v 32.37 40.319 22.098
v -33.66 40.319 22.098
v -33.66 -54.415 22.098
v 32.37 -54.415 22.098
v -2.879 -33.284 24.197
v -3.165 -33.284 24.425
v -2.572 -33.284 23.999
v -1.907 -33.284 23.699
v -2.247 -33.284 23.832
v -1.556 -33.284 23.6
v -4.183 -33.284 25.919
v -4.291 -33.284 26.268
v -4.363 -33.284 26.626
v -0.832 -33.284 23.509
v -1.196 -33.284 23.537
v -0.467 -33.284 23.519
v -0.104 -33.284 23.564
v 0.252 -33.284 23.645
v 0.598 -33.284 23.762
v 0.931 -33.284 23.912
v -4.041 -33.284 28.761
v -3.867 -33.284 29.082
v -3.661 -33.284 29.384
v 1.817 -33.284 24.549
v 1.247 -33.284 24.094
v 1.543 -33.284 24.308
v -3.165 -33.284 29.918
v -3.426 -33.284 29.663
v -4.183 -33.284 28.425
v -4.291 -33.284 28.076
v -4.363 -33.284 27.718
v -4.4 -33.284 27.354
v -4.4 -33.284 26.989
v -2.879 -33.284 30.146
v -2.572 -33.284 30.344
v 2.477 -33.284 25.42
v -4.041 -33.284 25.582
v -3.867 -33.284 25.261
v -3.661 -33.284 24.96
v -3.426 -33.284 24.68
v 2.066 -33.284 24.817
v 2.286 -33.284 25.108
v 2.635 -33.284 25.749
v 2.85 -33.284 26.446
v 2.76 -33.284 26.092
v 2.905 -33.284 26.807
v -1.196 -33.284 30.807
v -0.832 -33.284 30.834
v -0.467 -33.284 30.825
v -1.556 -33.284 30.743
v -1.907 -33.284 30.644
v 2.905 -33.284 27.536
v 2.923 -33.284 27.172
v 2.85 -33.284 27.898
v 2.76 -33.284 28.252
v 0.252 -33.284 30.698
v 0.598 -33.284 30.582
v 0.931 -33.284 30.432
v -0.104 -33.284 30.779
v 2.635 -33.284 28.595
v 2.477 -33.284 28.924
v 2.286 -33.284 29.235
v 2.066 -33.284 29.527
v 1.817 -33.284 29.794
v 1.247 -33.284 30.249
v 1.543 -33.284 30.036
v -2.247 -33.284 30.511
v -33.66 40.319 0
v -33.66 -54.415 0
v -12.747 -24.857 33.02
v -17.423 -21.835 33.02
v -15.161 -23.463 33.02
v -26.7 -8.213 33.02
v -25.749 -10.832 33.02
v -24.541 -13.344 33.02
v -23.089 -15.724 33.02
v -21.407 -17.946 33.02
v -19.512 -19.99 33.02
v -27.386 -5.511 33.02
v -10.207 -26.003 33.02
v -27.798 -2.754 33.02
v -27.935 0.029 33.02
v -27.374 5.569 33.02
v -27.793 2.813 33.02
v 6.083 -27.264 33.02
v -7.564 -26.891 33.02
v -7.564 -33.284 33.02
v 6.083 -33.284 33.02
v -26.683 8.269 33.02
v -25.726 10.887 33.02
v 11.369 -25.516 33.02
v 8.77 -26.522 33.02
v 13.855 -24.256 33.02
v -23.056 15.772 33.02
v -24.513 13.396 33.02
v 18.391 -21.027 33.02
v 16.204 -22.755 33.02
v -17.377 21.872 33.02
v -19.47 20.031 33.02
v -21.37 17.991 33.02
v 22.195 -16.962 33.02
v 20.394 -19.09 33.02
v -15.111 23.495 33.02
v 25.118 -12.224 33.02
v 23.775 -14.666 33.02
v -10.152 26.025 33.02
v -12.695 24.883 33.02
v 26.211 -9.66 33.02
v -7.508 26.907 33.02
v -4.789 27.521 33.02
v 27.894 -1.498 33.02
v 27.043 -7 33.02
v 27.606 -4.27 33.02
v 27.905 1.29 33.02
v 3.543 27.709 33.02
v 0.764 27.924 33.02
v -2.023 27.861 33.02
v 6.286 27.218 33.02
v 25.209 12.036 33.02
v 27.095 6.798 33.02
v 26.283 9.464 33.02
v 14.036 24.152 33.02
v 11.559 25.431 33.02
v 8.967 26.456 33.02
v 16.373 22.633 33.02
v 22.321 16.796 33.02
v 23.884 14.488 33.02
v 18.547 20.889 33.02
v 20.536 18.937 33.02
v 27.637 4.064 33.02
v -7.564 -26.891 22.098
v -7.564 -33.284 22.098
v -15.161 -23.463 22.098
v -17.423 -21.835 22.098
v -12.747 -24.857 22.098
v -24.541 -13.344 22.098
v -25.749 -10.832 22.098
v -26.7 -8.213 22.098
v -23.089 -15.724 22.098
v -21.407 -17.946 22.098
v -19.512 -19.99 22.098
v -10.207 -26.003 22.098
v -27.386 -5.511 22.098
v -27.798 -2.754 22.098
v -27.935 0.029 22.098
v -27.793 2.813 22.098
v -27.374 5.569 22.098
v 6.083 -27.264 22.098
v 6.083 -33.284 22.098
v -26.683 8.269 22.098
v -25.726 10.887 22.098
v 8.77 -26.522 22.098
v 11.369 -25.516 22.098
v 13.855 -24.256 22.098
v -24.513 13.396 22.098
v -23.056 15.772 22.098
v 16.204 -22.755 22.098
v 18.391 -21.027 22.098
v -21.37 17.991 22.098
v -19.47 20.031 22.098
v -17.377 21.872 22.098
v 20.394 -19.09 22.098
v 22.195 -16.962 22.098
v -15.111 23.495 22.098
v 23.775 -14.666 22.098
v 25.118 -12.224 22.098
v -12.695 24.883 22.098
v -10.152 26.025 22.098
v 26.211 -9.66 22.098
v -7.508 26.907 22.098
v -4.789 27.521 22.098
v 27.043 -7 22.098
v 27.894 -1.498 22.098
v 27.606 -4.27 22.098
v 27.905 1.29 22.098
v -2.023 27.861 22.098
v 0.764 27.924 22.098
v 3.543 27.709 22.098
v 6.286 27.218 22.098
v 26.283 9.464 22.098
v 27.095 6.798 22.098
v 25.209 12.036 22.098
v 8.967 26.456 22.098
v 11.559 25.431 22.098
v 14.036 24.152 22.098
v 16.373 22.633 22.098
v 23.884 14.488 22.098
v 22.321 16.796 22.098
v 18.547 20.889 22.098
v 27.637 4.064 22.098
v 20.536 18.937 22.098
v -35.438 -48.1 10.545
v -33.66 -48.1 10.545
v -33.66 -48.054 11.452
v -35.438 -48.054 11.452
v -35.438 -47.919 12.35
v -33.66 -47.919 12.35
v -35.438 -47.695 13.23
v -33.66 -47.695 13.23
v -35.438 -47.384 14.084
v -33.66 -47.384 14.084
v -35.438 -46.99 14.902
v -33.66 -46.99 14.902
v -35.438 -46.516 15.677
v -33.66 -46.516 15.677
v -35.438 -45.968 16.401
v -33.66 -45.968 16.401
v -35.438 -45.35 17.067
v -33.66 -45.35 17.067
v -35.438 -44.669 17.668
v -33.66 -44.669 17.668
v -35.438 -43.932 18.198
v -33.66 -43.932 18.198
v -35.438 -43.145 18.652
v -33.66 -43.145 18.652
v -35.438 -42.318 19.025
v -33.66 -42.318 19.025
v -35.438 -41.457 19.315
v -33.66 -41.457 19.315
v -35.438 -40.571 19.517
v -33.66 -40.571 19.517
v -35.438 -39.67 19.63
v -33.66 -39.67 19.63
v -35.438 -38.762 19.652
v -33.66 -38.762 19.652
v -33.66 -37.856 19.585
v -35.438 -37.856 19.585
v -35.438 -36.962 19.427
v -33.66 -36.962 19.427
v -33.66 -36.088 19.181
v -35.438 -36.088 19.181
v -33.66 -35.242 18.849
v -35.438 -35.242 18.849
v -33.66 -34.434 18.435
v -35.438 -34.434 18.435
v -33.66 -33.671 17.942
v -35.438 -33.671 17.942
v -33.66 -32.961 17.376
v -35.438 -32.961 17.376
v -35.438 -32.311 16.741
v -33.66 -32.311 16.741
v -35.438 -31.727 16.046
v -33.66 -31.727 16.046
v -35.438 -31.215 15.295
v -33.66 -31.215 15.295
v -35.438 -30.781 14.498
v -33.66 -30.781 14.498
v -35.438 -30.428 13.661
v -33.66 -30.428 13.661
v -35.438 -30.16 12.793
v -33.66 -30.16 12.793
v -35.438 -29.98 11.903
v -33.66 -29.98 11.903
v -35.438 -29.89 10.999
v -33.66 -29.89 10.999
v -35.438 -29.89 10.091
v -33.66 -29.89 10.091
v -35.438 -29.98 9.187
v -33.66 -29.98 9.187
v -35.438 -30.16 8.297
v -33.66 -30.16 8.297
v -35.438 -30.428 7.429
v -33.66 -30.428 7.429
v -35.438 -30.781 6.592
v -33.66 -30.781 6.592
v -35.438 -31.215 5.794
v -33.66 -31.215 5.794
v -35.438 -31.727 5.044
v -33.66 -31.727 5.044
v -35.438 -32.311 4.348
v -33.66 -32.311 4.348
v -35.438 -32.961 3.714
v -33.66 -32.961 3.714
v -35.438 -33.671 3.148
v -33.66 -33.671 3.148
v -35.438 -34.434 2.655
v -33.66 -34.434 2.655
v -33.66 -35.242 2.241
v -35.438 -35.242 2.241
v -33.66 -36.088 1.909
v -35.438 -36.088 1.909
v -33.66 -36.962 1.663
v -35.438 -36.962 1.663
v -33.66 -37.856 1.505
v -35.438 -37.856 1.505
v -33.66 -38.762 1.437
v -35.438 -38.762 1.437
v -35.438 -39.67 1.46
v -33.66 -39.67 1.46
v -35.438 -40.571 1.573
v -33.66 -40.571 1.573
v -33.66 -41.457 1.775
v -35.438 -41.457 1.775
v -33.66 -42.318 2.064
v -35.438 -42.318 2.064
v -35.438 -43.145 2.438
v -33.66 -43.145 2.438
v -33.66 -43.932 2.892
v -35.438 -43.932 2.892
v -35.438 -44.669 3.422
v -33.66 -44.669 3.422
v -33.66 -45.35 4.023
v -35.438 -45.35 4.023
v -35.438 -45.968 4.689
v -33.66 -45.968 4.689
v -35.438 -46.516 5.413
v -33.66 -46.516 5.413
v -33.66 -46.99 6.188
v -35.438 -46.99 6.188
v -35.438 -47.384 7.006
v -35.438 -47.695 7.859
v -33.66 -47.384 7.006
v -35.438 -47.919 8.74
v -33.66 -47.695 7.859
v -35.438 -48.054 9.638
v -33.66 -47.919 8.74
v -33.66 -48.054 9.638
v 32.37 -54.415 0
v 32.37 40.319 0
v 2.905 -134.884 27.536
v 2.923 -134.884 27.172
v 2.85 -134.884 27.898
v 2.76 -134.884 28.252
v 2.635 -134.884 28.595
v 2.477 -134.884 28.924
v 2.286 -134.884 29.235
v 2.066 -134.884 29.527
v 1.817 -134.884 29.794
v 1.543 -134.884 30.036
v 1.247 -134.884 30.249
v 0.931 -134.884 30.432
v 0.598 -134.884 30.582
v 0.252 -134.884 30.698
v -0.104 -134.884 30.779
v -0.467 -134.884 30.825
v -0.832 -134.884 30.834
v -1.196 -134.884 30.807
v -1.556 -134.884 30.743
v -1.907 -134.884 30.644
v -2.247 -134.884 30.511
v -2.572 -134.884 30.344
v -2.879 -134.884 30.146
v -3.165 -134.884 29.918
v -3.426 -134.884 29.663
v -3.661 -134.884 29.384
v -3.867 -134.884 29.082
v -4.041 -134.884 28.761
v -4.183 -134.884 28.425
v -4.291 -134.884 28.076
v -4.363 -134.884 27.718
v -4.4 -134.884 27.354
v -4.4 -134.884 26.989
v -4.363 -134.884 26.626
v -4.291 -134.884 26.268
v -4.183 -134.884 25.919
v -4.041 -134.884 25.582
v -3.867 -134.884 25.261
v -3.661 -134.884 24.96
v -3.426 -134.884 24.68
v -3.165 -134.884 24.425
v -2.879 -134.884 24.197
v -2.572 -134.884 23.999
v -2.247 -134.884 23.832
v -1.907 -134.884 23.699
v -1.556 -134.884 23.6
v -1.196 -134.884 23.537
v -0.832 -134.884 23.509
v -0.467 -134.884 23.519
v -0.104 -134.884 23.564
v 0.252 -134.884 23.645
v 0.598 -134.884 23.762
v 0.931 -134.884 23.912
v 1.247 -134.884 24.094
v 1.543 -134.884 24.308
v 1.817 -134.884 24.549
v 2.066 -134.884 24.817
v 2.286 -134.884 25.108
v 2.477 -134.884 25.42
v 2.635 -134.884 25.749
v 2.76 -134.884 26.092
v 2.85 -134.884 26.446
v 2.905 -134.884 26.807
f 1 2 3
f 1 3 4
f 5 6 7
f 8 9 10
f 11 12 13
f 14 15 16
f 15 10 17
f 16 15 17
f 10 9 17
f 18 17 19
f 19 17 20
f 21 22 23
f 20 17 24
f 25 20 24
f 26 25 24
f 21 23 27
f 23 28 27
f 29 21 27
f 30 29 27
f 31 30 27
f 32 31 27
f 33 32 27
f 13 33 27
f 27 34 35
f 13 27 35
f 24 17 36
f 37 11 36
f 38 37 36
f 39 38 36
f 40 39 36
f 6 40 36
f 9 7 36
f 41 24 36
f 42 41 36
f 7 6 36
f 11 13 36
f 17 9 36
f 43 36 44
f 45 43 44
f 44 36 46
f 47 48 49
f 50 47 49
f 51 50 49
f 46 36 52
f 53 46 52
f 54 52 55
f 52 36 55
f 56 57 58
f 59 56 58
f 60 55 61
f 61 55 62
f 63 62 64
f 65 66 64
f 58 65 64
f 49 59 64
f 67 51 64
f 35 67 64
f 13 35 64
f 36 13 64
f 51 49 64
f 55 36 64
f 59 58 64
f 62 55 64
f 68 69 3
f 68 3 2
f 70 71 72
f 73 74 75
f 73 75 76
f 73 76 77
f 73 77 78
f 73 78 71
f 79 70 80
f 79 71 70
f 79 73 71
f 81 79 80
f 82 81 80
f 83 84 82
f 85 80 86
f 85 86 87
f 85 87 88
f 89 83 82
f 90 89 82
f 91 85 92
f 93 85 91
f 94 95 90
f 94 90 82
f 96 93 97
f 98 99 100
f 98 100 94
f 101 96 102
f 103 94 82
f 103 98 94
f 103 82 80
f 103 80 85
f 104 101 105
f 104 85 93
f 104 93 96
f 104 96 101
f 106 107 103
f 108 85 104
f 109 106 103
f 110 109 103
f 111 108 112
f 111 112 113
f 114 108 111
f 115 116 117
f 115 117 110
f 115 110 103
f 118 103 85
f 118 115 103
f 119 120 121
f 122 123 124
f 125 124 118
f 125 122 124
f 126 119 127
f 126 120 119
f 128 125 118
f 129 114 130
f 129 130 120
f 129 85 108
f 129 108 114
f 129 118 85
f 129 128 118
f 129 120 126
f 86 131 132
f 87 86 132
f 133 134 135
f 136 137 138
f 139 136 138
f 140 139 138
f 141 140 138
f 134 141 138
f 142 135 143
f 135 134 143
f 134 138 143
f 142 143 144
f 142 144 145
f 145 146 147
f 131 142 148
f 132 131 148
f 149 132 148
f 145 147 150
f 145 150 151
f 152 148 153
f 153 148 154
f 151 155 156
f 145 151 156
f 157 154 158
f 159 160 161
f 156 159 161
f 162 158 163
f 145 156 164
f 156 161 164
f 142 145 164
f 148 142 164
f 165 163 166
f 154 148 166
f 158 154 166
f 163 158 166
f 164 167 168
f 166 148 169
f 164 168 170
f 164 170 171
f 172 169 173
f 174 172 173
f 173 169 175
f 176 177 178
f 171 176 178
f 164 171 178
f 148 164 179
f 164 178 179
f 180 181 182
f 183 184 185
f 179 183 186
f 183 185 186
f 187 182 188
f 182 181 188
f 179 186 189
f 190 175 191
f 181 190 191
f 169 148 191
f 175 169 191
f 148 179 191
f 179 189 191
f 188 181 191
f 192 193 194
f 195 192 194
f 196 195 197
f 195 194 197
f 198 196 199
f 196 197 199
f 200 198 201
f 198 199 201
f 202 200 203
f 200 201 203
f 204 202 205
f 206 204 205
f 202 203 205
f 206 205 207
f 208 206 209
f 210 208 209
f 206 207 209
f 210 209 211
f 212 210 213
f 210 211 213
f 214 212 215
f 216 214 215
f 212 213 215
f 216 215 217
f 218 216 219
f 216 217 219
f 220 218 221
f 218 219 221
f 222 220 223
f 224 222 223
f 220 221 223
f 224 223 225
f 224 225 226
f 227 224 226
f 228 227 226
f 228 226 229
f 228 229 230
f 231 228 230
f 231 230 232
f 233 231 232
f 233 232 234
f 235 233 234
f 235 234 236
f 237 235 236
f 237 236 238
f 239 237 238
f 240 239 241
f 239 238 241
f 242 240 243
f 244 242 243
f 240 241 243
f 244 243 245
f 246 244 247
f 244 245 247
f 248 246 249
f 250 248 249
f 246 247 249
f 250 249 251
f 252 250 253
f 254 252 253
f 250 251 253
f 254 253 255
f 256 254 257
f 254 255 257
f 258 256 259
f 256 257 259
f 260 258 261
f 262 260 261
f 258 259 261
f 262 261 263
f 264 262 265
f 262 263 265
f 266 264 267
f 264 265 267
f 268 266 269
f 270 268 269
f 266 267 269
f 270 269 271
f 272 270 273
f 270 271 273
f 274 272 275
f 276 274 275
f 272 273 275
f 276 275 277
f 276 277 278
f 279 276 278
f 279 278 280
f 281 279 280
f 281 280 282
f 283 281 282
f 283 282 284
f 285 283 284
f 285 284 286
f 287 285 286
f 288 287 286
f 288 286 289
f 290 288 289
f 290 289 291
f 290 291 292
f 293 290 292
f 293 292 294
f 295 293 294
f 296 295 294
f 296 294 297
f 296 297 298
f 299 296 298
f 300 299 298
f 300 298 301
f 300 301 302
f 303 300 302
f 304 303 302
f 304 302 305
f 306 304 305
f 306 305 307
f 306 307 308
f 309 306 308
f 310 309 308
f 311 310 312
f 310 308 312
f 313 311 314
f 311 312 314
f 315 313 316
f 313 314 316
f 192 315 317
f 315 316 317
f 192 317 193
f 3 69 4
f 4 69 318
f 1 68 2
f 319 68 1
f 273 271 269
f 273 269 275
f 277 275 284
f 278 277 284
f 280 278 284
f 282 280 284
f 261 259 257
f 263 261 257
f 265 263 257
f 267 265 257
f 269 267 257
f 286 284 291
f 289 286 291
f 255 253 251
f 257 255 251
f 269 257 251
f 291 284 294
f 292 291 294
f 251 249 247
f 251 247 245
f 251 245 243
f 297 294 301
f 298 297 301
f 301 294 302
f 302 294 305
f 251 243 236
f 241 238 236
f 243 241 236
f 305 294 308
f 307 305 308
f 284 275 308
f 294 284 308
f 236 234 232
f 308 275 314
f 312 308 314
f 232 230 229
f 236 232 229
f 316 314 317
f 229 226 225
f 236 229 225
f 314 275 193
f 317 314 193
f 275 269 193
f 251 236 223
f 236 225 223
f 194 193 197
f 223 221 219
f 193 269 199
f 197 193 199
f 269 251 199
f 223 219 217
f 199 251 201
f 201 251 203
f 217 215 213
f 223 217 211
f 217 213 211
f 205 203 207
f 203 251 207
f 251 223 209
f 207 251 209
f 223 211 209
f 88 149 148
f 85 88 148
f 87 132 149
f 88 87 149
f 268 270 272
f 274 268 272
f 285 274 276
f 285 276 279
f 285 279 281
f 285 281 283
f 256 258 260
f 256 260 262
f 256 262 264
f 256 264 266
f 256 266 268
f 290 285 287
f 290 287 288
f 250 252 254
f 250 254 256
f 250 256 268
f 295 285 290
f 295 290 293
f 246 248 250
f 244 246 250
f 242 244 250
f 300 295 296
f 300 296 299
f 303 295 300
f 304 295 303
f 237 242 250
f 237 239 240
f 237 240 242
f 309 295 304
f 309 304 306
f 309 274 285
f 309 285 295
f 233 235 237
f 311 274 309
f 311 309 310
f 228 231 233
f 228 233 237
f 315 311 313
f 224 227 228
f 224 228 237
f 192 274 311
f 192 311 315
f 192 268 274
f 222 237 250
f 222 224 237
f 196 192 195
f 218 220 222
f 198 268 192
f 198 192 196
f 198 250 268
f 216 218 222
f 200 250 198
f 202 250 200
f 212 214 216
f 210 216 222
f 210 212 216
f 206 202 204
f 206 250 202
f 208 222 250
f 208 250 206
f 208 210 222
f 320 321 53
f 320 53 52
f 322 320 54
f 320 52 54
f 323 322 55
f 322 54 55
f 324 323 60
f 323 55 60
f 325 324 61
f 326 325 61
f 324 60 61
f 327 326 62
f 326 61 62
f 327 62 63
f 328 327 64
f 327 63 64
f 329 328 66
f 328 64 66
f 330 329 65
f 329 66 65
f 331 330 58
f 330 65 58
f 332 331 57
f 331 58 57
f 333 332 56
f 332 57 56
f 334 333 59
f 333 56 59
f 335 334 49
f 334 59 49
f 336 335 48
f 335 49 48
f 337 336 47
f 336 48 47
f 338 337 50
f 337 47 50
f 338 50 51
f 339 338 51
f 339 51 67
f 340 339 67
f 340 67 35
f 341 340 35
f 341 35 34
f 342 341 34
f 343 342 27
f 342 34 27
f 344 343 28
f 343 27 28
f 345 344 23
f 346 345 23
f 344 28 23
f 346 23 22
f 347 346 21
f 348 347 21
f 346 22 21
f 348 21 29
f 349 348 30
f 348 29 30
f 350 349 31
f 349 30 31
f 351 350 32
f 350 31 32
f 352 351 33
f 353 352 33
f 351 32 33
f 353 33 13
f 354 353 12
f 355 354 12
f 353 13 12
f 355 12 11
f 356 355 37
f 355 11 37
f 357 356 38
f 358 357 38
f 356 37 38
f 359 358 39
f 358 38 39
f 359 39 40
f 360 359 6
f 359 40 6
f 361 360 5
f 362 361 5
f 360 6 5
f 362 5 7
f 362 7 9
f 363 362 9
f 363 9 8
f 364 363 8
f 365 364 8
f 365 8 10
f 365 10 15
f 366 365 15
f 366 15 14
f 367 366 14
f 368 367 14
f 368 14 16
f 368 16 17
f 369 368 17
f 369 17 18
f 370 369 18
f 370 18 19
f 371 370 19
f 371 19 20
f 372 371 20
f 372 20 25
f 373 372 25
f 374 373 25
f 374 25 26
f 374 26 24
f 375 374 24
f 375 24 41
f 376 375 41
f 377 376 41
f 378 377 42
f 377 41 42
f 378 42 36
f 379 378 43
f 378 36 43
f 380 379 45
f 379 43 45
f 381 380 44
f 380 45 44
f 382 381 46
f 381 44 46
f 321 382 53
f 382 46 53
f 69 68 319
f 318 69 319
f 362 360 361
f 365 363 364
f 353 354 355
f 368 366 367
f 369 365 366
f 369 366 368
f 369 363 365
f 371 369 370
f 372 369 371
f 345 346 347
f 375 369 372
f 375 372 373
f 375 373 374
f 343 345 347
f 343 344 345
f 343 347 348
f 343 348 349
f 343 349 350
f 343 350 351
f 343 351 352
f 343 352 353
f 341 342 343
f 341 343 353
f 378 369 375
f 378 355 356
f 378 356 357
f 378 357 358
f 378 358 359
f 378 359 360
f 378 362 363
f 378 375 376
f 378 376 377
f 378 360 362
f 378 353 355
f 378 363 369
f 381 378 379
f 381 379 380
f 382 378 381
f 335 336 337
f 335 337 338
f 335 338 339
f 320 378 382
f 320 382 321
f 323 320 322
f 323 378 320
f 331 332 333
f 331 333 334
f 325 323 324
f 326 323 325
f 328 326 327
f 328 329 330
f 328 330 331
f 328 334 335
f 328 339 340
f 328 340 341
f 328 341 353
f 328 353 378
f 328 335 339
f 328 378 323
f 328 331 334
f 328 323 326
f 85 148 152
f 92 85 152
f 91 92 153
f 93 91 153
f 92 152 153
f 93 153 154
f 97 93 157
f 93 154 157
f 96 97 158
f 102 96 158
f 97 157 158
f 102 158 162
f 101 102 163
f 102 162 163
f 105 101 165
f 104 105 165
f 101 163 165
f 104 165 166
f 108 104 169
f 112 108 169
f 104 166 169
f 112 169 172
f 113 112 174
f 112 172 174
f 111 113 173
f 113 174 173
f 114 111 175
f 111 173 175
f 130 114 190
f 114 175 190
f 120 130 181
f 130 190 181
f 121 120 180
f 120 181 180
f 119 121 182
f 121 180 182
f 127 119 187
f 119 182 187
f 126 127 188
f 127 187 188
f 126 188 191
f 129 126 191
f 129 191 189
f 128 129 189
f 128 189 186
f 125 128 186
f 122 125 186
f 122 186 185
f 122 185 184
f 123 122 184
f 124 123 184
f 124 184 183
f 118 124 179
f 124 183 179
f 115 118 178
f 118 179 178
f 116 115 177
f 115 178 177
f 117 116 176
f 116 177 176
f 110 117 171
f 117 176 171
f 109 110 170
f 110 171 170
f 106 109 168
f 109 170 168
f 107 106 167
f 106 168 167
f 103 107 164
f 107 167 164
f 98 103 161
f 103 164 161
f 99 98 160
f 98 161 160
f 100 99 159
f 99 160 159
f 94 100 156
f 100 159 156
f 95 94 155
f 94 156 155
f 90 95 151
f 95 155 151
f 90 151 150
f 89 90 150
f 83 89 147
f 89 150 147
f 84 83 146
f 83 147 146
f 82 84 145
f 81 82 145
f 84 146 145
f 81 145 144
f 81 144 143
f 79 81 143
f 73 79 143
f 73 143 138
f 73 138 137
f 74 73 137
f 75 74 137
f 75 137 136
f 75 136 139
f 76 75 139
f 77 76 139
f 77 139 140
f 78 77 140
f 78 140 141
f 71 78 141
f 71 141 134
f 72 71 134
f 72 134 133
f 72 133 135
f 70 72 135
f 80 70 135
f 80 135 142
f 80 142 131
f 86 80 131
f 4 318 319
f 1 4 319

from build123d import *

# Parameters (mm, degrees)
F0_W     = 66.0297609866
F0_H     = 94.7342179716
F1_DEPTH = 22.098
F3_DEPTH = 10.922
F4_R     = 3.6634356374
F5_DEPTH = 101.6
F6_R     = 9.1104151175
F7_DEPTH = 1.778


with BuildPart() as f1:
    # F0 (on Top) → F1 (new body)
    with BuildSketch(Plane.XY):
        with Locations((-0.6452407688, -7.0482958108)):
            Rectangle(F0_W, F0_H)
    extrude(amount=F1_DEPTH)


with BuildPart() as f3:
    # F2 (on face) → F3 (new body)
    with BuildSketch(Plane.XY.offset(22.098)):
        with BuildLine():
            ThreePointArc((6.0832463205, -27.2641839674), (21.797644794, -17.470097156), (27.9345952755, 0))
            ThreePointArc((27.9345952755, 0), (-16.8675799898, 22.2671587432), (-7.5644949102, -26.890891208))
            ThreePointArc((-7.5644949102, -26.890891208), (-0.7637808699, -27.9241517685), (6.0832463205, -27.2641839674))
        make_face()
        with BuildLine():
            ThreePointArc((6.0832463205, -27.2641839674), (-0.7637808699, -27.9241517685), (-7.5644949102, -26.890891208))
            Line((-7.5644949102, -26.890891208), (-7.5644949102, -33.2837412526))
            Line((-7.5644949102, -33.2837412526), (6.0832463205, -33.2837412526))
            Line((6.0832463205, -33.2837412526), (6.0832463205, -27.2641839674))
        make_face()
    extrude(amount=F3_DEPTH)


with BuildPart() as f5:
    # F4 (on face) → F5 (new body)
    with BuildSketch(Plane.XZ.offset(33.2837412526)):
        with Locations((-0.7406242949, 27.171716094)):
            Circle(F4_R)
    extrude(amount=F5_DEPTH)


with BuildPart() as f7:
    # F6 (on face) → F7 (new body)
    with BuildSketch(Plane(origin=(-33.6601212621, 0, 0), x_dir=(0, -1, 0), z_dir=(-1, 0, 0))):
        with Locations((38.9891192317, 10.5448067188)):
            Circle(F6_R)
    extrude(amount=F7_DEPTH)


solid = Compound([f1.part, f3.part, f5.part, f7.part])
